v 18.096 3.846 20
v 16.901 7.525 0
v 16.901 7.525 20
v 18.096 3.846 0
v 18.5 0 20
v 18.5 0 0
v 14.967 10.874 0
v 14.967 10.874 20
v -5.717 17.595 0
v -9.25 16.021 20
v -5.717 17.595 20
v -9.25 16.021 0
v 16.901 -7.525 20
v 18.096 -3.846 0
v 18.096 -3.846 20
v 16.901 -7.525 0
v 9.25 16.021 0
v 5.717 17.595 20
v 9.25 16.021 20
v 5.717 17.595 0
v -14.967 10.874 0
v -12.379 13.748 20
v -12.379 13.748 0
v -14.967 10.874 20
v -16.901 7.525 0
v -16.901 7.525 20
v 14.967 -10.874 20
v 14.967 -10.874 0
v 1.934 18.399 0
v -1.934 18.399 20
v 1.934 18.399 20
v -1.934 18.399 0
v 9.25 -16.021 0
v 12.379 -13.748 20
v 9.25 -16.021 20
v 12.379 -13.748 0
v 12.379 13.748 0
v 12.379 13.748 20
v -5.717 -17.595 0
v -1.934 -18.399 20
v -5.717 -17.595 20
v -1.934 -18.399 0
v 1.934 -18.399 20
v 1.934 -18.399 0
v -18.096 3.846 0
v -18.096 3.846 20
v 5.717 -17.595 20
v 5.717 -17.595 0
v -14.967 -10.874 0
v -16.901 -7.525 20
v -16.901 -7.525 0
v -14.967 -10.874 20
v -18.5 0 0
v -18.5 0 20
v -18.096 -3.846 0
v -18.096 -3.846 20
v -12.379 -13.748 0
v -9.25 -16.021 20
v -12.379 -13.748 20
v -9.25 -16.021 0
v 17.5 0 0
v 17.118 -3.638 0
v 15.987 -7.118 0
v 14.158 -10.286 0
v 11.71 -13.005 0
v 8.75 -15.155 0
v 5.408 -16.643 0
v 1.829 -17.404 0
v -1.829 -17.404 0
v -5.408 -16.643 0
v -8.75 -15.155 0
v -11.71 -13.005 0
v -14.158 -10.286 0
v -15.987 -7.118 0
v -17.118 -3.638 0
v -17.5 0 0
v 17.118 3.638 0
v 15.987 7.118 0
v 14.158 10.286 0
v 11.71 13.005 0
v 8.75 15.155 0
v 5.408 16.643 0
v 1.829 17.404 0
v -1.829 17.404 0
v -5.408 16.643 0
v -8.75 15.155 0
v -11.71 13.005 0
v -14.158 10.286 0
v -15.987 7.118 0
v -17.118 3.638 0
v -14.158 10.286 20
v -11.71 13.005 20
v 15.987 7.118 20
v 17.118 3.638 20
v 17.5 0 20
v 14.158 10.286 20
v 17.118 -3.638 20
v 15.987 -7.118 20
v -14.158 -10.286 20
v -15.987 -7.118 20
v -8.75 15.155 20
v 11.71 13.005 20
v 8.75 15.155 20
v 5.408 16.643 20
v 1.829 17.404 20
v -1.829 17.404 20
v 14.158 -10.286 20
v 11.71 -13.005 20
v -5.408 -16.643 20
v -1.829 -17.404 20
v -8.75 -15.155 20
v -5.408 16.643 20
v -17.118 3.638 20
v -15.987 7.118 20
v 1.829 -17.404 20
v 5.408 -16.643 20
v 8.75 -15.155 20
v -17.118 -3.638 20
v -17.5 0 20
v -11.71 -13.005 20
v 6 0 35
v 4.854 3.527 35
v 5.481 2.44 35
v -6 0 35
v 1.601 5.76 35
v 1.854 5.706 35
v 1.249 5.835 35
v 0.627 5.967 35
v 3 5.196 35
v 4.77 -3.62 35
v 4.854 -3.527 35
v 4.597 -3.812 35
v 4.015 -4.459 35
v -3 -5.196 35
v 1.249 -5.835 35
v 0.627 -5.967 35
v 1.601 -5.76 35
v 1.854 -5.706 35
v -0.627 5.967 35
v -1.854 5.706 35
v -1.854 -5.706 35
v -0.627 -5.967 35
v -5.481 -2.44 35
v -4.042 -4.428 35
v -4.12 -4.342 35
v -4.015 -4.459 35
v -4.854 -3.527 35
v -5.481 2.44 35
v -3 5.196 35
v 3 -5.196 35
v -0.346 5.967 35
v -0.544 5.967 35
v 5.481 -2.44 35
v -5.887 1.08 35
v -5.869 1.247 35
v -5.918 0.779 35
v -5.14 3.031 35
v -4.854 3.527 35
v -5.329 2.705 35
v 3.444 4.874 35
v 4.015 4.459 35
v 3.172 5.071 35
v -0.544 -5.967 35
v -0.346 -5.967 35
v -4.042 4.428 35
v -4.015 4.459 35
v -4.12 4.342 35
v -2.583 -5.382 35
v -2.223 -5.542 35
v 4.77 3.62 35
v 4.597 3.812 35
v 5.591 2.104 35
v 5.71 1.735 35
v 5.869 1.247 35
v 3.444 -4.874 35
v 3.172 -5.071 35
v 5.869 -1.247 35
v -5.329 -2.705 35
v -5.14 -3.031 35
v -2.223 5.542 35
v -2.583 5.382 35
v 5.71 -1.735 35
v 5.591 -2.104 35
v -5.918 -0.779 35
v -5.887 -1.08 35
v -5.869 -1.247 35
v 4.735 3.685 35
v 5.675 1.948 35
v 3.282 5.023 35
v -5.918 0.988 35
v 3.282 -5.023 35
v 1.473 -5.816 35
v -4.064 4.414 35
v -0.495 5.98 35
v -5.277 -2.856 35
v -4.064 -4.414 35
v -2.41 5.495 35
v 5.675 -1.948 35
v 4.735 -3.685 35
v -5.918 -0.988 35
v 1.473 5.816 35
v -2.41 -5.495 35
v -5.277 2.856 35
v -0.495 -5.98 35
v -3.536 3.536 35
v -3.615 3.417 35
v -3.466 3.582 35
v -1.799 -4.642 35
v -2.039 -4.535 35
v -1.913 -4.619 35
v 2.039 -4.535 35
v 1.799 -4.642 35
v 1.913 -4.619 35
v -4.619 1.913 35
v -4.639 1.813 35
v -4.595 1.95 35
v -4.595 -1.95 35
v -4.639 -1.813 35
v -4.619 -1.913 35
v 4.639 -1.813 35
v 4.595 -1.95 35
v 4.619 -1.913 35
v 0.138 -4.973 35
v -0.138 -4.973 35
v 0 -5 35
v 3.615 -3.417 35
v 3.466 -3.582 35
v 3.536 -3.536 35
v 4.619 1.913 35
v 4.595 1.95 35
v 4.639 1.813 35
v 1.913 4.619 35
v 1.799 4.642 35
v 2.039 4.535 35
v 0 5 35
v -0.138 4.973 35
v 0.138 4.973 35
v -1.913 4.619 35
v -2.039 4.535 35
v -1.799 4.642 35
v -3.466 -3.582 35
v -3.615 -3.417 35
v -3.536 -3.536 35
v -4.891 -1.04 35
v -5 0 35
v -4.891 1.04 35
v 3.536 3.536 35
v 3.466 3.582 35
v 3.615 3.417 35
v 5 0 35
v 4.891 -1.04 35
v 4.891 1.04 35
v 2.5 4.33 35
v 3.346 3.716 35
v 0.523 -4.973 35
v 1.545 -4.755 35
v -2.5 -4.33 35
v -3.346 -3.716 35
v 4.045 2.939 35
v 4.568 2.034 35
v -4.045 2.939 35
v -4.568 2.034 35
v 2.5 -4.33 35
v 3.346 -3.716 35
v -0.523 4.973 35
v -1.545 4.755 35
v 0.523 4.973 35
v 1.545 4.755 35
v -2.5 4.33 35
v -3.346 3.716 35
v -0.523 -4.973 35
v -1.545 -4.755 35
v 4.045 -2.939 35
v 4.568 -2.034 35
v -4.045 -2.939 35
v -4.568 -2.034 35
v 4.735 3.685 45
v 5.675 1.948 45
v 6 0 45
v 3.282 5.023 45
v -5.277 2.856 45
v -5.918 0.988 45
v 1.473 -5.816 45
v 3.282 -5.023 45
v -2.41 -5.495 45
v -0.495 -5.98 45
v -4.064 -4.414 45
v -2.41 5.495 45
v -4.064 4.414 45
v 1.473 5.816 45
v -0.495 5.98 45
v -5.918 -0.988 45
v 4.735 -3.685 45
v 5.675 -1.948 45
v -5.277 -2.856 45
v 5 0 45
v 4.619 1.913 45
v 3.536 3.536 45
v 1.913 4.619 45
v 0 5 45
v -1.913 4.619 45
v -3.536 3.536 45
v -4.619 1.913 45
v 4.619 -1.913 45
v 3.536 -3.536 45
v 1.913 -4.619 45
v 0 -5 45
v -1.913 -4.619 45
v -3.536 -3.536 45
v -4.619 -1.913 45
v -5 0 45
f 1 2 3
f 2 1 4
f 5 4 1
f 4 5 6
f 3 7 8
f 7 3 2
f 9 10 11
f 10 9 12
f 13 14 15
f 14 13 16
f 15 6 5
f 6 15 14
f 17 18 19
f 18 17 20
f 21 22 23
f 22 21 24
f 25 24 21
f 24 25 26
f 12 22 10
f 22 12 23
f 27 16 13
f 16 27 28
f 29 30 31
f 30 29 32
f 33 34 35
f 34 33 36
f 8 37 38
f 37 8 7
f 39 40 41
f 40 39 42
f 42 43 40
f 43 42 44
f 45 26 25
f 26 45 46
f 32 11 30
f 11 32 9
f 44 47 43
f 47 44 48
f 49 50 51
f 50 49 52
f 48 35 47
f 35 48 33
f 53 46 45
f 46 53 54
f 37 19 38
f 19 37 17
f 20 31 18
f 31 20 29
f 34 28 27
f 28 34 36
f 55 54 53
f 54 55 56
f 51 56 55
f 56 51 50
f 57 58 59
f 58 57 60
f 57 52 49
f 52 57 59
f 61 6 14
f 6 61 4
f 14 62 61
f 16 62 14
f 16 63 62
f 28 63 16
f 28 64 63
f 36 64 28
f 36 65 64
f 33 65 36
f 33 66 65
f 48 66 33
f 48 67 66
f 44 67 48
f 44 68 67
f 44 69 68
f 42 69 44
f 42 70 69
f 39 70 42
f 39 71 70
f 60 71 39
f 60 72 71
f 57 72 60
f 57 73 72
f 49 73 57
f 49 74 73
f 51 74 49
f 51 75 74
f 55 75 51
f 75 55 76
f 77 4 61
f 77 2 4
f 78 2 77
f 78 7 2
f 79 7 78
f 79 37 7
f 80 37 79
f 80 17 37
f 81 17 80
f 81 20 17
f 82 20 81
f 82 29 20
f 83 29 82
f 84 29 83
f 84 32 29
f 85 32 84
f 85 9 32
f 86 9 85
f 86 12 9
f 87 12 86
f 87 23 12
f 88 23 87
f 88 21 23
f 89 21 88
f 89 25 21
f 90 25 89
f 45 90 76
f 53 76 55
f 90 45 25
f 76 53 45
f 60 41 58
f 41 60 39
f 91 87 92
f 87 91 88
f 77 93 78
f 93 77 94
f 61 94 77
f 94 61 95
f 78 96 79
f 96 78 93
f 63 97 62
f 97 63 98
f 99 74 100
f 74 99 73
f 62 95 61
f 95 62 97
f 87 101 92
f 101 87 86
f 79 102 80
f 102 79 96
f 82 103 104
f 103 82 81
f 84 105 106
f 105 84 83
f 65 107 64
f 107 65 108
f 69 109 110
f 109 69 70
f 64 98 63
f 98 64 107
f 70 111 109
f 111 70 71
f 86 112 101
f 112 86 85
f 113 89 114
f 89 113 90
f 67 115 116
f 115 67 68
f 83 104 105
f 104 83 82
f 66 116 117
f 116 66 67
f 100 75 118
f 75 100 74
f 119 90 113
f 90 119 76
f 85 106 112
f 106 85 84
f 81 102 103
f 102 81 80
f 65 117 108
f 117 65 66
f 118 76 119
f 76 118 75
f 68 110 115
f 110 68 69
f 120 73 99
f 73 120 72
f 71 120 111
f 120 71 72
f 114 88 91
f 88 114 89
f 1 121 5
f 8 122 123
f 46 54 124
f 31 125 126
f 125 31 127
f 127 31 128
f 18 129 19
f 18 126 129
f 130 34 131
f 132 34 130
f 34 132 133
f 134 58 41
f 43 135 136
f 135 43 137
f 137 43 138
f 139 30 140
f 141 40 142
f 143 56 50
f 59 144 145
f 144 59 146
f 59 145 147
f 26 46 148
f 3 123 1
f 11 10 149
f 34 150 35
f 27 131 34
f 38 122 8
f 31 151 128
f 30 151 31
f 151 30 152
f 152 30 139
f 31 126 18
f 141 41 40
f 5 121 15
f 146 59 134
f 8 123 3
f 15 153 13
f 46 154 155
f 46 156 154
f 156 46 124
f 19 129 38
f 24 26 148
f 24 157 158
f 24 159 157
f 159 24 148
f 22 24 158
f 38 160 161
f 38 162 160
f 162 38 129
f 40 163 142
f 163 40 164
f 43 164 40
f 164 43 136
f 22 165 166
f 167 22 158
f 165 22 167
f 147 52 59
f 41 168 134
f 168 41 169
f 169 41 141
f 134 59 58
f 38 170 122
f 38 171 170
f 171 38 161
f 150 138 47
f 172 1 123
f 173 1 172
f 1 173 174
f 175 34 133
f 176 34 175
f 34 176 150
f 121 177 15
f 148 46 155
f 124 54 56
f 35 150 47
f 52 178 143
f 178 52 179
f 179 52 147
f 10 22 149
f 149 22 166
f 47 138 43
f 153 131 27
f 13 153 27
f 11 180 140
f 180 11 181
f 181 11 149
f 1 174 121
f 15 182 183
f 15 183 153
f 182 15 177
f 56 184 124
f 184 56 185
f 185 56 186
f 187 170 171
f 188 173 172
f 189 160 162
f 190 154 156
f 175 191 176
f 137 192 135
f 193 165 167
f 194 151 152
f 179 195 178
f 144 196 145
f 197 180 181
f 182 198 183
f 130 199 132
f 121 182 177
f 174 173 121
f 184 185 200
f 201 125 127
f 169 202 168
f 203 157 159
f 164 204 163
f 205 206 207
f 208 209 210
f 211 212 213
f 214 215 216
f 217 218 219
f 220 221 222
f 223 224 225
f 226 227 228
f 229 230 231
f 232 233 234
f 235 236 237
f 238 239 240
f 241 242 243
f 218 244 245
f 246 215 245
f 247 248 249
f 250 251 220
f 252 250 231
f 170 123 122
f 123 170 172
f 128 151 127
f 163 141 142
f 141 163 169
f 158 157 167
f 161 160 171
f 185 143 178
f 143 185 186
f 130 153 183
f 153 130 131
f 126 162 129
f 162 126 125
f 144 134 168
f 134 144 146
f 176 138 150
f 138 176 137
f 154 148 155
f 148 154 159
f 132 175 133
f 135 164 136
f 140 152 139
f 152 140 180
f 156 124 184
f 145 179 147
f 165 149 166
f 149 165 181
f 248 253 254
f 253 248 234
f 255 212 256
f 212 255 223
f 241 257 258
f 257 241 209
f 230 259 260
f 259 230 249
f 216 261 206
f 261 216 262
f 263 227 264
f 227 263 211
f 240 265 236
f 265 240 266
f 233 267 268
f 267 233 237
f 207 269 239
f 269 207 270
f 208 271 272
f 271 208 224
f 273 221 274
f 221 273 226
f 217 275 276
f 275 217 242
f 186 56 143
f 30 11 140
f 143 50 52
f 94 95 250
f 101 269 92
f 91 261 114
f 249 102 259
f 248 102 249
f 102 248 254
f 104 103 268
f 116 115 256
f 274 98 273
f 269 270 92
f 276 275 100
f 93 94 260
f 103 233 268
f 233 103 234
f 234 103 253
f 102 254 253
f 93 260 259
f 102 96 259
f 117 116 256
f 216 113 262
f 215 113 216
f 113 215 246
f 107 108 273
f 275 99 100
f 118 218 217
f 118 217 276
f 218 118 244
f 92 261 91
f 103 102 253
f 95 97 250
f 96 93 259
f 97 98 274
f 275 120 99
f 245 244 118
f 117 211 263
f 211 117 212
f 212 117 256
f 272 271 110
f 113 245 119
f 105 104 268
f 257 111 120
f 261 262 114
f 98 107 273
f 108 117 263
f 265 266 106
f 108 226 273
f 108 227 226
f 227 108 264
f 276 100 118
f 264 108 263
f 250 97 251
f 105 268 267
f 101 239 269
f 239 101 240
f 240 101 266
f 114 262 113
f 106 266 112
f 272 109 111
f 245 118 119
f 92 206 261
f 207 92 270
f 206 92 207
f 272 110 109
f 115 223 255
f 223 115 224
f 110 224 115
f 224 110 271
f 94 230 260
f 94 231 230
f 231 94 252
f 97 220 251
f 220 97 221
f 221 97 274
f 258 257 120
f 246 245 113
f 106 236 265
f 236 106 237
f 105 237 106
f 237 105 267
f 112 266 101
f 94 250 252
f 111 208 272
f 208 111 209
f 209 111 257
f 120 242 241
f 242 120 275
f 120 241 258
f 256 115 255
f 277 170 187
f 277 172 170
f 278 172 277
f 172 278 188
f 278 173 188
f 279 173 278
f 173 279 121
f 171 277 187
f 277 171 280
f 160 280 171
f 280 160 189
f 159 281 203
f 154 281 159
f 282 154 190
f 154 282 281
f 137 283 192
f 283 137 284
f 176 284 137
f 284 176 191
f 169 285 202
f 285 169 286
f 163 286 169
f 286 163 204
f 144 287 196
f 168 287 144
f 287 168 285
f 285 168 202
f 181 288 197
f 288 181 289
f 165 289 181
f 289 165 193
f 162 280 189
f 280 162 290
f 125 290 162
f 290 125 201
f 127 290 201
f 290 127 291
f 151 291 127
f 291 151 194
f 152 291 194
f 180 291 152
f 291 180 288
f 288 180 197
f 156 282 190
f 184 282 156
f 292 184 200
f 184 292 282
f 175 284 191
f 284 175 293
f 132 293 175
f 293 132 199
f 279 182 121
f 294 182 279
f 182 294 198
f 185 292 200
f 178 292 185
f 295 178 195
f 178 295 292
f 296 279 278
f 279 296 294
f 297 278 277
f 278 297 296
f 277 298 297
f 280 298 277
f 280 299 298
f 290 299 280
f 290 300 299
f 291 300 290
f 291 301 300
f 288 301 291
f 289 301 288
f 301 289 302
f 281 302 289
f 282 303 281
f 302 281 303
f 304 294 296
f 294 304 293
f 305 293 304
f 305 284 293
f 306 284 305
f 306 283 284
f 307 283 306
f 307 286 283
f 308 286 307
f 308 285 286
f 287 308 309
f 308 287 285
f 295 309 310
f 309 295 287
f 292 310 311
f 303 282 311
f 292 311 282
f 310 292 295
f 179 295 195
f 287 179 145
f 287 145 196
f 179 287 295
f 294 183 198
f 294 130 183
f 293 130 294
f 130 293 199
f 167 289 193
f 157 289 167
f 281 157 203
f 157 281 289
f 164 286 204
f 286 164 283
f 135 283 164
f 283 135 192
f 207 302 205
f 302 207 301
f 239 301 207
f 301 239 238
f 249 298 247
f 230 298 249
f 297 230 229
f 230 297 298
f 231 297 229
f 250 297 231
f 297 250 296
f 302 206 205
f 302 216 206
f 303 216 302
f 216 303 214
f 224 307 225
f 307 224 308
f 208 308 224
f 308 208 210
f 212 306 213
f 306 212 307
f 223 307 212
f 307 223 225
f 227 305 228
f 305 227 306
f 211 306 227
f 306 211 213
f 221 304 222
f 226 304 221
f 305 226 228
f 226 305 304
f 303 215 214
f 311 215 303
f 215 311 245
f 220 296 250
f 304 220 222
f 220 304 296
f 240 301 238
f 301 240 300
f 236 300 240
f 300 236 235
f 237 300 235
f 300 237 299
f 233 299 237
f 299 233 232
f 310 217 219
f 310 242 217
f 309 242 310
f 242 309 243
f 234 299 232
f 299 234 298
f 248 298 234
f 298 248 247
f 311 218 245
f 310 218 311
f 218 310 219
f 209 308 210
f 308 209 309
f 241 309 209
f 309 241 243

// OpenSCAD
rohr_durchmesser = 35;
rohr_hoehe = 20;
dicke=2;
duese_durchmesser = 10;
duese_hoehe=10;

hoehe_trichter=15;

//rohr
pipe(rohr_durchmesser, rohr_durchmesser+dicke, rohr_hoehe);

//trichter
translate([0,0,rohr_hoehe])
trichter(rohr_durchmesser,duese_durchmesser, dicke, hoehe_trichter);
// duese
translate([0,0,rohr_hoehe+hoehe_trichter])
pipe(duese_durchmesser, duese_durchmesser+dicke, duese_hoehe);

module pipe(in, out, height){
    
    difference(){
        cylinder(h=height,d=out );
        cylinder(h=height,d=in );
        }
    }
    
    
module trichter(in1,in2, thickness, height){
    
    difference(){
        cylinder(h=height,d1=in1+thickness, d2=in2+thickness);
        cylinder(h=height,d1=in1, d2=in2);
    }
}
